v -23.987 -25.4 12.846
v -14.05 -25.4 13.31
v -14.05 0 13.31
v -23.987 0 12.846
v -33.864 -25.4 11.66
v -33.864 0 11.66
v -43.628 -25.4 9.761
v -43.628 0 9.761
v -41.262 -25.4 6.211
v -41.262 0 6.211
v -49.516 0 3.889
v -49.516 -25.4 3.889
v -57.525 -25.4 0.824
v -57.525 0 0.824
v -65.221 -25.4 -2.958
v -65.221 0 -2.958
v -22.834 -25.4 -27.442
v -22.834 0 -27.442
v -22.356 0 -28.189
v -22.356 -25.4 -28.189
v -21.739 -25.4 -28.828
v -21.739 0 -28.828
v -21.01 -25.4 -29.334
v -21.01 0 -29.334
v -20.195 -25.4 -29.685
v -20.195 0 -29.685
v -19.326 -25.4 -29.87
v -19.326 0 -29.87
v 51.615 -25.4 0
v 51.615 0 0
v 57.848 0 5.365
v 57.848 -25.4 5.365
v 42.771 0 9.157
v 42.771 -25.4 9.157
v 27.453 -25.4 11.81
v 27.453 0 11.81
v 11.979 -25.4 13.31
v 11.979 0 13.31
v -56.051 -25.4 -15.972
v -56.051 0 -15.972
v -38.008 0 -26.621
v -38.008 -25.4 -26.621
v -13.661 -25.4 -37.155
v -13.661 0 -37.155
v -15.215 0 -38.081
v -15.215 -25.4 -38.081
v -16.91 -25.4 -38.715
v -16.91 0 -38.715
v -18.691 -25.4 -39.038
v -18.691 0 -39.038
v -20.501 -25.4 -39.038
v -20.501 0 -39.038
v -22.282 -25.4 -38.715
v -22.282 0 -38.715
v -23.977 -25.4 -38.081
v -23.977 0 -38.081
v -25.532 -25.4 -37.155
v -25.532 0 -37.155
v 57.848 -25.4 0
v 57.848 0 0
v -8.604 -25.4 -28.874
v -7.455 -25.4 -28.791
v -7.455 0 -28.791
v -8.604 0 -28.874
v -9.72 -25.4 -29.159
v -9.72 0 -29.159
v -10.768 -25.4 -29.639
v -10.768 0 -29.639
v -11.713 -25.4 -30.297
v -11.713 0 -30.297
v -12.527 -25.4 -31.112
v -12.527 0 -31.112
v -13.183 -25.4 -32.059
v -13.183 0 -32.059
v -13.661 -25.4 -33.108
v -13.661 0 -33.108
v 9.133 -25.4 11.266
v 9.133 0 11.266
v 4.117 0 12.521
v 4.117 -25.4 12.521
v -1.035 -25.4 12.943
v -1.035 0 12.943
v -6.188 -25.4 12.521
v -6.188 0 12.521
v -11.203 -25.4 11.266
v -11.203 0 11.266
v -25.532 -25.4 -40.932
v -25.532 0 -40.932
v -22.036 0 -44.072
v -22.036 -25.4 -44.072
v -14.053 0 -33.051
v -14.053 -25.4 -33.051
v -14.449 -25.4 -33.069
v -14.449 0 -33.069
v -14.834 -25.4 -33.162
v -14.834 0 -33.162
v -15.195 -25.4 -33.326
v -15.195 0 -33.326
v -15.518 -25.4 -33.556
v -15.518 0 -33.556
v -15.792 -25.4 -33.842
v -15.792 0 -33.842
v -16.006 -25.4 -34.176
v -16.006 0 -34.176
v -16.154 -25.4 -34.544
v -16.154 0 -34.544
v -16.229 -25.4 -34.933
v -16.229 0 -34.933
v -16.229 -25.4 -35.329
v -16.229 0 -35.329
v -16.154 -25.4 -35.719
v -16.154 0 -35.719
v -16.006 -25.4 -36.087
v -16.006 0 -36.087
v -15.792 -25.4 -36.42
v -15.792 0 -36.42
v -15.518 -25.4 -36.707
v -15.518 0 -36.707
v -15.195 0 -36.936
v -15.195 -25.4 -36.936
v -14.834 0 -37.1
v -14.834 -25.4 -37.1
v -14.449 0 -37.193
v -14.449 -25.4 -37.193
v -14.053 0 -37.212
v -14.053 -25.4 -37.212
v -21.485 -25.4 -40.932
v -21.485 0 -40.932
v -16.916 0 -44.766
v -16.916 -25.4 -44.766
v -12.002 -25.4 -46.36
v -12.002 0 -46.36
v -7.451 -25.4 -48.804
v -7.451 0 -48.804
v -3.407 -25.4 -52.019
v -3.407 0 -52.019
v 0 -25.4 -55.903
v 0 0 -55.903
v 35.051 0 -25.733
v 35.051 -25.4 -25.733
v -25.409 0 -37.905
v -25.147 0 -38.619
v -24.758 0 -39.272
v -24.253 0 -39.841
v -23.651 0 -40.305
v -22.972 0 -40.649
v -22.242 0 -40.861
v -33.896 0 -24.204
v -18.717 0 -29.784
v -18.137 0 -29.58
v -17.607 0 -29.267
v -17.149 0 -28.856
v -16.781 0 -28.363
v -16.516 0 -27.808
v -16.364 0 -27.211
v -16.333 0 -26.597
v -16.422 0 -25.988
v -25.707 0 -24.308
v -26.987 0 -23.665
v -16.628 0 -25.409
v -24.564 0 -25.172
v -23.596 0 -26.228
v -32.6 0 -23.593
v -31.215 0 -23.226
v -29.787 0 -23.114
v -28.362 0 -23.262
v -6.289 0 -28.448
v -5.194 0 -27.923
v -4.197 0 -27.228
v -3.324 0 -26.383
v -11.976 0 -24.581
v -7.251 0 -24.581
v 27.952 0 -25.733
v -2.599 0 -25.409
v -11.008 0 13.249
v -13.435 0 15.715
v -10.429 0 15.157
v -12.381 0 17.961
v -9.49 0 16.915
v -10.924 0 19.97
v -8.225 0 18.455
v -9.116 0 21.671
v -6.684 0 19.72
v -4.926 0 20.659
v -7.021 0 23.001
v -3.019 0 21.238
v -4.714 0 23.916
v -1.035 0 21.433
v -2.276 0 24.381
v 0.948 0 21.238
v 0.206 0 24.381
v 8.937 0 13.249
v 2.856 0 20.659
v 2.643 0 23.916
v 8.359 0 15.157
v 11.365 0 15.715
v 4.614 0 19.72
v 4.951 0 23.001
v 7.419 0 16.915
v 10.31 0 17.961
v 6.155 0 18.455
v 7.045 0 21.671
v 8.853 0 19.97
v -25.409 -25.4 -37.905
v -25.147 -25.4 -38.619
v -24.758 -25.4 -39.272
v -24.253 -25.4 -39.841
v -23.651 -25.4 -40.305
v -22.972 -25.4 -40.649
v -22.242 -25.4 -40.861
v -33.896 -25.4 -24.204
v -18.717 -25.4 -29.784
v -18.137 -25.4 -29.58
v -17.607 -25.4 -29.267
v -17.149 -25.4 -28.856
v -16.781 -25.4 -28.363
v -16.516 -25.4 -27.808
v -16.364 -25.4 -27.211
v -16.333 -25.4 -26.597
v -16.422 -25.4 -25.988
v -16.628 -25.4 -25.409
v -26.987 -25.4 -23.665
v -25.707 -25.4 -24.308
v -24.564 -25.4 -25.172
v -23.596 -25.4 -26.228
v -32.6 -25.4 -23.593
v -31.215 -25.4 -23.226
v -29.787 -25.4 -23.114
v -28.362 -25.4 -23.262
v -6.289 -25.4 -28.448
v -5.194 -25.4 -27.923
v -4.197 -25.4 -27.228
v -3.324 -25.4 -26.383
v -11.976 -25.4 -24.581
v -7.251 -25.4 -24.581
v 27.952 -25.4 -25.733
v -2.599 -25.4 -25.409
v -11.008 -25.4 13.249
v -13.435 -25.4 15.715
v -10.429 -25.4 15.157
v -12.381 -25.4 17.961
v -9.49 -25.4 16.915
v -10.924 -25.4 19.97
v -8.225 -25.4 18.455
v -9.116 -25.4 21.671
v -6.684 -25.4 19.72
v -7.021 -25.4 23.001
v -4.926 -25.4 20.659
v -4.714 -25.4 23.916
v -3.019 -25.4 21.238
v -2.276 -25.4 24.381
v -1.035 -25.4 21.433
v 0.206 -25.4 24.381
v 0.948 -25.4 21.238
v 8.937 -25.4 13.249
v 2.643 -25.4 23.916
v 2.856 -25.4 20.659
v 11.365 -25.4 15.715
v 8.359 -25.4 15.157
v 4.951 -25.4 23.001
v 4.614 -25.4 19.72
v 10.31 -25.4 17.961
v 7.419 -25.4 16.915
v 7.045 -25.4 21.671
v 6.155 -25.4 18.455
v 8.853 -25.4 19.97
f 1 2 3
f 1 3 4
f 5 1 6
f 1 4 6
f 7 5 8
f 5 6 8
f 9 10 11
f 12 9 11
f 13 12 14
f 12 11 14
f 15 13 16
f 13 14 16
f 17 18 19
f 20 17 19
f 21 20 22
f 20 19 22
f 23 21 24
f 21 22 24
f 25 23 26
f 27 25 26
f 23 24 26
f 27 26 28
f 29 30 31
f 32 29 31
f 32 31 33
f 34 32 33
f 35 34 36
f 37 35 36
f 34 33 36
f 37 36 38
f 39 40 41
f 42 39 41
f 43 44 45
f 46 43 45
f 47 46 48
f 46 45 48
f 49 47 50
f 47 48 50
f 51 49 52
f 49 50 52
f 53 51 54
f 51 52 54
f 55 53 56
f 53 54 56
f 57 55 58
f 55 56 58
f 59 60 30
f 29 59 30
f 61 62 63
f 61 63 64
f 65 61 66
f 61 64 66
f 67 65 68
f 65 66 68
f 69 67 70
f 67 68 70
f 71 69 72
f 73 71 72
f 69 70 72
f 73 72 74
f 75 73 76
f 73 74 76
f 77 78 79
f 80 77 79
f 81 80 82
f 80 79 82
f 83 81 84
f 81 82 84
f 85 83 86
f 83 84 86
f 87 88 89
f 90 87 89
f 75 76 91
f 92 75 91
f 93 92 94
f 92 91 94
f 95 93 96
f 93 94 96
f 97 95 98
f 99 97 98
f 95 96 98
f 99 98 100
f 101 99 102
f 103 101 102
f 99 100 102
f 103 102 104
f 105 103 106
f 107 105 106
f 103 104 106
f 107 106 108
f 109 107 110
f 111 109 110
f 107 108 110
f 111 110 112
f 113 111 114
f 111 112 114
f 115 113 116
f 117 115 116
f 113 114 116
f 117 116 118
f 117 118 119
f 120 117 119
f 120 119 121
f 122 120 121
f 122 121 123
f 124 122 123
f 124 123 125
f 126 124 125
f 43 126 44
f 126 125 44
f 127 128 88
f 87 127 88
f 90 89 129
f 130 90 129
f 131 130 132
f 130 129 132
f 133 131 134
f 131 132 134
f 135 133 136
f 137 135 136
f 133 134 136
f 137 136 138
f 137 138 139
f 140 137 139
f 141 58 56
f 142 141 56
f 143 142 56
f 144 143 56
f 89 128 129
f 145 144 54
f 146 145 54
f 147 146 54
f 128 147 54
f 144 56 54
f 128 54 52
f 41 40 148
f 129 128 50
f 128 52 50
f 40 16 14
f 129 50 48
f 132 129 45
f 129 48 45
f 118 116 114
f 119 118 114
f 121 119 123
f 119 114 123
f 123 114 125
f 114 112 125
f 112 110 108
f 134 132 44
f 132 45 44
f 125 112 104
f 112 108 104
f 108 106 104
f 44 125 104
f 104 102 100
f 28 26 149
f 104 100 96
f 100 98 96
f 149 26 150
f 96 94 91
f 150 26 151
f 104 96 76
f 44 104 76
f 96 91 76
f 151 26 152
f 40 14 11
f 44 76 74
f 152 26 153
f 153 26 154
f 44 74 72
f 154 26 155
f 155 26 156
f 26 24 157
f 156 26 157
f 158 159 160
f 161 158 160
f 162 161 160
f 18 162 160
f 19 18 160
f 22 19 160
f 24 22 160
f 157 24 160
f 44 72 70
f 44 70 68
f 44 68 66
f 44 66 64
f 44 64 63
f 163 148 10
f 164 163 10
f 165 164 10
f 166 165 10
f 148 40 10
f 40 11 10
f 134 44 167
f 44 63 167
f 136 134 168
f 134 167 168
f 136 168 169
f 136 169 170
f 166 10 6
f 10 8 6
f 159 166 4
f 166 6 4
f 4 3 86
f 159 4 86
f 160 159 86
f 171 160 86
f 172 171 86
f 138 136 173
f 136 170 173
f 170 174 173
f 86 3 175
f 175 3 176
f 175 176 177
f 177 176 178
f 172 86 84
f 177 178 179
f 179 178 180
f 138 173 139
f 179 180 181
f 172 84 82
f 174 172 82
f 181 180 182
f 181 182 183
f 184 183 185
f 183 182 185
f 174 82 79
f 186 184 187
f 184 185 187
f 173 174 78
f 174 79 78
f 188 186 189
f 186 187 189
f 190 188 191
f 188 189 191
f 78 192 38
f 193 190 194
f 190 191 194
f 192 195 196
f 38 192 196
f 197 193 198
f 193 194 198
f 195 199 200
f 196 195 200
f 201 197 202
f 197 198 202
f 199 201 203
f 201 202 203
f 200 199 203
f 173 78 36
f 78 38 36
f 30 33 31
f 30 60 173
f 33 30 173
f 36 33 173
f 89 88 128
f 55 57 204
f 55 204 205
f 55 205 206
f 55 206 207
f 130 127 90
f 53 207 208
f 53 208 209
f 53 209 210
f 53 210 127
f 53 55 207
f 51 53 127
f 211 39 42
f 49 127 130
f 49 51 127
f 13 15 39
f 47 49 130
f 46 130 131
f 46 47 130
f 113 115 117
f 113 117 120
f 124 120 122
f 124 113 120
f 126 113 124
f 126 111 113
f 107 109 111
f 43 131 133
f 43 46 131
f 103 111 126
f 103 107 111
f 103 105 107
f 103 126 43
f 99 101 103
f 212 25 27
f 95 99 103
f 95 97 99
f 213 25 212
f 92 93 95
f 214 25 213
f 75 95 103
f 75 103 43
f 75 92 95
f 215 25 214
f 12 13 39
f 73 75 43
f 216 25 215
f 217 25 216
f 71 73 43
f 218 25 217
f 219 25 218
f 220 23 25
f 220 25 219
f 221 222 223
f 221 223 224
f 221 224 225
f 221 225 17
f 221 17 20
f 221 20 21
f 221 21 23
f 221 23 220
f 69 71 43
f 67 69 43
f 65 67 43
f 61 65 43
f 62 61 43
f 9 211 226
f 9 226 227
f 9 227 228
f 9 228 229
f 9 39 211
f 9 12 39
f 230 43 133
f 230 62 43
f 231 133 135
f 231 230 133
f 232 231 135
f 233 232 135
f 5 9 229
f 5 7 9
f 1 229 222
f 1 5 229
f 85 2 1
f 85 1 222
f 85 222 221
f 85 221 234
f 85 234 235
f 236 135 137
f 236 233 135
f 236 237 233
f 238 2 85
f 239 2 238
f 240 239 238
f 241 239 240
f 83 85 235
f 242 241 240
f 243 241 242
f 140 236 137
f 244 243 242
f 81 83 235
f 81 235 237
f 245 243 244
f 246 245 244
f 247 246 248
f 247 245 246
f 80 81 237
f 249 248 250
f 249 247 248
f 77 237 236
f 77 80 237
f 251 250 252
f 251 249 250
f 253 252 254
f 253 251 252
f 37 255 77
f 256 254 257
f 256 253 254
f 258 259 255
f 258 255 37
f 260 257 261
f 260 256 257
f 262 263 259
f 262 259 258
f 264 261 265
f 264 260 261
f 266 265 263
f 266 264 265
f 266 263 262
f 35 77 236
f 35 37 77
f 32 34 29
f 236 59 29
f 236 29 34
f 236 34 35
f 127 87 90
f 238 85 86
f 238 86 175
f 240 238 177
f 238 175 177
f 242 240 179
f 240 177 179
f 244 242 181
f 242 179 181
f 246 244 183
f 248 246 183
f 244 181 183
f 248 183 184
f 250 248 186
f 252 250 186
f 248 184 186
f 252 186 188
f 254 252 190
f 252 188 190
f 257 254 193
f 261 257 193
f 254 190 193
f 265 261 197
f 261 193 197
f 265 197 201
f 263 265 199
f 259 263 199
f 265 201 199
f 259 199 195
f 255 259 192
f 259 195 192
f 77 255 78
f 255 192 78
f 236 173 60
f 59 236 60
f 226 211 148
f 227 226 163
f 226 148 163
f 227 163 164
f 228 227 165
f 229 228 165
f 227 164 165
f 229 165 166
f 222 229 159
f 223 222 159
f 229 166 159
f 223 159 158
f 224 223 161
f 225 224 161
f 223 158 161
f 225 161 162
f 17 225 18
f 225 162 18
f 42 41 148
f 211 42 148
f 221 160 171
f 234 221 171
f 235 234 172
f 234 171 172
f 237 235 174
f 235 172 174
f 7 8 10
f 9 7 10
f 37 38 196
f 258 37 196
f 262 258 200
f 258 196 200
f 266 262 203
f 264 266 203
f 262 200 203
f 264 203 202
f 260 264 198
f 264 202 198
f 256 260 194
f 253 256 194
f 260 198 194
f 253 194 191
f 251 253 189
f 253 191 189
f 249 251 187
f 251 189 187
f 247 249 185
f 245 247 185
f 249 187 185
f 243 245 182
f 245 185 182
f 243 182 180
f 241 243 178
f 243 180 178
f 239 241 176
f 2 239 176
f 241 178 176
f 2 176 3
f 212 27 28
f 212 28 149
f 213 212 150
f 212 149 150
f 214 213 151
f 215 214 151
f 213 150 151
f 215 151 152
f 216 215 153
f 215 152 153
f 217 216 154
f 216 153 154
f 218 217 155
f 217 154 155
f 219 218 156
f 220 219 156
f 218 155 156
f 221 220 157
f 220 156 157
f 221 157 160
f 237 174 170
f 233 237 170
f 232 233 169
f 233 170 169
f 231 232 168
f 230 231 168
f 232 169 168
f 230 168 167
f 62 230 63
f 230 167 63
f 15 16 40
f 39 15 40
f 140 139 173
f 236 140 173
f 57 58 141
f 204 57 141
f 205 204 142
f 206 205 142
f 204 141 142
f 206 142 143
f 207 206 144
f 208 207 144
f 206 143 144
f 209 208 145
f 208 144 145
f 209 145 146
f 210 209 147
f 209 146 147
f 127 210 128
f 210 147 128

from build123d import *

# Parameters (mm, degrees)
F1_DEPTH = 25.4


with BuildPart() as f1:
    # F0 (on Front) → F1 (new body)
    with BuildSketch(Plane.XZ):
        with BuildLine():
            ThreePointArc((-22.036027, -44.072051), (-9.67173, -47.480311), (0, -55.903476))
            Line((0, -55.903476), (35.050593, -25.733344))
            Line((35.050593, -25.733344), (27.95174, -25.733344))
            Line((27.95174, -25.733344), (57.84783, 0))
            Line((57.84783, 0), (51.614583, 0))
            Line((51.614583, 0), (57.84783, 5.365327))
            ThreePointArc((57.84783, 5.365327), (35.136908, 10.627208), (11.979315, 13.310351))
            ThreePointArc((11.979315, 13.310351), (-1.03525, 24.439791), (-14.049816, 13.310351))
            ThreePointArc((-14.049816, 13.310351), (-28.935956, 12.342824), (-43.628372, 9.760925))
            Line((-43.628372, 9.760925), (-41.26209, 6.211497))
            ThreePointArc((-41.26209, 6.211497), (-53.555536, 2.447613), (-65.220721, -2.957856))
            Line((-65.220721, -2.957856), (-56.05137, -15.972422))
            Line((-56.05137, -15.972422), (-38.008448, -26.620703))
            Line((-38.008448, -26.620703), (-33.895824, -24.204055))
            ThreePointArc((-33.895824, -24.204055), (-27.665097, -23.432097), (-22.833852, -27.441703))
            ThreePointArc((-22.833852, -27.441703), (-21.387026, -29.099123), (-19.326398, -29.869942))
            ThreePointArc((-19.326398, -29.869942), (-16.78065, -28.362967), (-16.628357, -25.408544))
            ThreePointArc((-16.628357, -25.408544), (-9.613447, -24.476899), (-2.598537, -25.408544))
            ThreePointArc((-2.598537, -25.408544), (-4.681451, -27.595484), (-7.455012, -28.790725))
            ThreePointArc((-7.455012, -28.790725), (-11.255149, -29.946665), (-13.66051, -33.107594))
            ThreePointArc((-13.66051, -33.107594), (-16.238261, -35.131125), (-13.66051, -37.154656))
            ThreePointArc((-13.66051, -37.154656), (-19.596203, -39.078416), (-25.531895, -37.154656))
            ThreePointArc((-25.531895, -37.154656), (-24.252791, -39.840887), (-21.484831, -40.931914))
            Line((-21.484831, -40.931914), (-25.531895, -40.931914))
            Line((-25.531895, -40.931914), (-22.036027, -44.072051))
        make_face()
        with BuildLine():
            ThreePointArc((-11.203147, 11.265573), (-1.03525, 21.43347), (9.132647, 11.265573))
            ThreePointArc((9.132647, 11.265573), (-1.03525, 12.94309), (-11.203147, 11.265573))
        make_face(mode=Mode.SUBTRACT)
    extrude(amount=F1_DEPTH)


solid = f1.part
